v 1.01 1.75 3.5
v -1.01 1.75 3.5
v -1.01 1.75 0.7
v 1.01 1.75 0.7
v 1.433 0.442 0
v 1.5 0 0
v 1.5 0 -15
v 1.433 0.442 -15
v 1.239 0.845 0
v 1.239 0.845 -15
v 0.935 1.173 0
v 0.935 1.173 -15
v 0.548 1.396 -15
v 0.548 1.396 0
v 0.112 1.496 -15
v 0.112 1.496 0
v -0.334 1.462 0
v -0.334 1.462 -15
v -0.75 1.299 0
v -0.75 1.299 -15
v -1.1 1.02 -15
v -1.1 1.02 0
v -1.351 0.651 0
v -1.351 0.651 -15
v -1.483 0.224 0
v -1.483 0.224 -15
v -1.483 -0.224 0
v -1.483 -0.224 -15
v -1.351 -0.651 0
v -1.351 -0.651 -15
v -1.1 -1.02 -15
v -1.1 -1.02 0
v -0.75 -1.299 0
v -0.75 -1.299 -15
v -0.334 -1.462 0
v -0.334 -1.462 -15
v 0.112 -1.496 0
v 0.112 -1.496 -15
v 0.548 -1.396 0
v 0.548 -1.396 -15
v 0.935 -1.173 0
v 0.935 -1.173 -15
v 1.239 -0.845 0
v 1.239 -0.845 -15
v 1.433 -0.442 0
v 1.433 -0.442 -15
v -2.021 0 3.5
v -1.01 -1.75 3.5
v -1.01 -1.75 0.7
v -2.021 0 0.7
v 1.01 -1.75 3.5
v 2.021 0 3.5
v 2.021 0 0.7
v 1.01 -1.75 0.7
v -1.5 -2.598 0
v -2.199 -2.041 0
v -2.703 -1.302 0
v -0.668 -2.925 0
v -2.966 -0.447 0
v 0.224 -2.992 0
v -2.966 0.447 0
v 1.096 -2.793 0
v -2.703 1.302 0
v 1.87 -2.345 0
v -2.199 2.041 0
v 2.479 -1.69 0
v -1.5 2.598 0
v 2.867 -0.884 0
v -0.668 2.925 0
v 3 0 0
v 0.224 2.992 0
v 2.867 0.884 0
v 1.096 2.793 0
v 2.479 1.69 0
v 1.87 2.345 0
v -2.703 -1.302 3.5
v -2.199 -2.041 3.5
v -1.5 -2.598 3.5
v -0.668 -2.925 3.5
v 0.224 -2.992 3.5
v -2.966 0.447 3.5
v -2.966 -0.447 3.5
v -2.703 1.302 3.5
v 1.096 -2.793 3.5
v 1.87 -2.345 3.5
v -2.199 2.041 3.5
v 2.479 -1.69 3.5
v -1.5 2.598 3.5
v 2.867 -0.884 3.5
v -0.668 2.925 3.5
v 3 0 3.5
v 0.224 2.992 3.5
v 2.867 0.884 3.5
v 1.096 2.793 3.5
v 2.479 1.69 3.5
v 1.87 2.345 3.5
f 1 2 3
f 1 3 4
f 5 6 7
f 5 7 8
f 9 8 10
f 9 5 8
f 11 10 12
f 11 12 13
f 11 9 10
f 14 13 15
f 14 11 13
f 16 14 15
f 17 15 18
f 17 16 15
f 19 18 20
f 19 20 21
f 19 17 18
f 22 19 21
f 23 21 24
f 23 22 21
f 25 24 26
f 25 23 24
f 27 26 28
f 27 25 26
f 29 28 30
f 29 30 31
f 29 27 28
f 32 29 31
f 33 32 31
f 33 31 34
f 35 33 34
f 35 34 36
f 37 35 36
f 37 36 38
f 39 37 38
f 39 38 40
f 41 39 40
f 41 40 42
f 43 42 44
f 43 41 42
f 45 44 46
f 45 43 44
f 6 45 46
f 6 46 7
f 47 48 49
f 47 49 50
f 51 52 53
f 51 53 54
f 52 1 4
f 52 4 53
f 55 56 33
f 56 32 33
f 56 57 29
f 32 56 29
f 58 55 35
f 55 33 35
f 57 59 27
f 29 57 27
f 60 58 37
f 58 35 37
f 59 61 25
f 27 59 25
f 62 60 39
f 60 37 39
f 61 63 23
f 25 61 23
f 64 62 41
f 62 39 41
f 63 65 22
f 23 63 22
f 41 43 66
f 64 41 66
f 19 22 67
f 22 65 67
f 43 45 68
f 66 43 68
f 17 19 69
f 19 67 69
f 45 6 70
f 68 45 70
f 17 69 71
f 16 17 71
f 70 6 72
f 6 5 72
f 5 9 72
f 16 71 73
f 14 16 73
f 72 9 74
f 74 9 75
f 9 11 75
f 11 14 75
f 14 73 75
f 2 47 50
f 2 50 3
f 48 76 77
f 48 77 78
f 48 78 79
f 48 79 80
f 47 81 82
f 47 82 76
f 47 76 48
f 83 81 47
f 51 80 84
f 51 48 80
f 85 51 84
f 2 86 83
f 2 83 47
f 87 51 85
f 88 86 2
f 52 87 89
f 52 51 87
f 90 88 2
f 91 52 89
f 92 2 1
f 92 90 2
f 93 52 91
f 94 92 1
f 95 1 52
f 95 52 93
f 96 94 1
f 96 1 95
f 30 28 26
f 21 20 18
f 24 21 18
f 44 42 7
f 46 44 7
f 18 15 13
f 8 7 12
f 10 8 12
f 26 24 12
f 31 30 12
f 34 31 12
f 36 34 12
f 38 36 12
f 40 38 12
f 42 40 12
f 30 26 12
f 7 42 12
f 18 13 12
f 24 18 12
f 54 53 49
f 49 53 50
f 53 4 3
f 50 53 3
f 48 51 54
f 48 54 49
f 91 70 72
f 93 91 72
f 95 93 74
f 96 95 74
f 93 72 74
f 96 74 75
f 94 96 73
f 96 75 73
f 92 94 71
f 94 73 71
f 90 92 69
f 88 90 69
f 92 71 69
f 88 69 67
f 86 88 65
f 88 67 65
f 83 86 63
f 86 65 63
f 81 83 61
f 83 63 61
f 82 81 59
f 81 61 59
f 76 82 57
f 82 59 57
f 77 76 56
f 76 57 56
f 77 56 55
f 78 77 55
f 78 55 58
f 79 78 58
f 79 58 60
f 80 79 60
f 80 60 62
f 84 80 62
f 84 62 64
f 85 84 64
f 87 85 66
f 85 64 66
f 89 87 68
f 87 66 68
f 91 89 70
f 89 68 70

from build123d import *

# Parameters (mm, degrees)
SKETCH1_R                   = 3
HEAD_BOSS_EXTRUDE1_DEPTH    = 3.5
HEAD_HEX_CUT_EXTRUDE1_DEPTH = 2.8
SKETCH2_R                   = 1.5
SCREW_BOSS_EXTRUDE2_DEPTH   = 15


with BuildPart() as part:
    # Sketch1 → Head Boss-Extrude1 (new body)
    with BuildSketch(Plane.XY):
        Circle(SKETCH1_R)
    extrude(amount=HEAD_BOSS_EXTRUDE1_DEPTH)

    # Sketch3 → Head Hex Cut-Extrude1 (cut)
    with BuildSketch(Plane.XY.offset(3.5)):
        Polygon((-1.010362971, 1.75), (1.010362971, 1.75), (2.020725942, 0), (1.010362971, -1.75), (-1.010362971, -1.75), (-2.020725942, 0), align=None)
    extrude(amount=-HEAD_HEX_CUT_EXTRUDE1_DEPTH, mode=Mode.SUBTRACT)

    # Sketch2 → Screw Boss-Extrude2 (add)
    with BuildSketch(Plane.XY):
        Circle(SKETCH2_R)
    extrude(amount=-SCREW_BOSS_EXTRUDE2_DEPTH)


solid = part.part
